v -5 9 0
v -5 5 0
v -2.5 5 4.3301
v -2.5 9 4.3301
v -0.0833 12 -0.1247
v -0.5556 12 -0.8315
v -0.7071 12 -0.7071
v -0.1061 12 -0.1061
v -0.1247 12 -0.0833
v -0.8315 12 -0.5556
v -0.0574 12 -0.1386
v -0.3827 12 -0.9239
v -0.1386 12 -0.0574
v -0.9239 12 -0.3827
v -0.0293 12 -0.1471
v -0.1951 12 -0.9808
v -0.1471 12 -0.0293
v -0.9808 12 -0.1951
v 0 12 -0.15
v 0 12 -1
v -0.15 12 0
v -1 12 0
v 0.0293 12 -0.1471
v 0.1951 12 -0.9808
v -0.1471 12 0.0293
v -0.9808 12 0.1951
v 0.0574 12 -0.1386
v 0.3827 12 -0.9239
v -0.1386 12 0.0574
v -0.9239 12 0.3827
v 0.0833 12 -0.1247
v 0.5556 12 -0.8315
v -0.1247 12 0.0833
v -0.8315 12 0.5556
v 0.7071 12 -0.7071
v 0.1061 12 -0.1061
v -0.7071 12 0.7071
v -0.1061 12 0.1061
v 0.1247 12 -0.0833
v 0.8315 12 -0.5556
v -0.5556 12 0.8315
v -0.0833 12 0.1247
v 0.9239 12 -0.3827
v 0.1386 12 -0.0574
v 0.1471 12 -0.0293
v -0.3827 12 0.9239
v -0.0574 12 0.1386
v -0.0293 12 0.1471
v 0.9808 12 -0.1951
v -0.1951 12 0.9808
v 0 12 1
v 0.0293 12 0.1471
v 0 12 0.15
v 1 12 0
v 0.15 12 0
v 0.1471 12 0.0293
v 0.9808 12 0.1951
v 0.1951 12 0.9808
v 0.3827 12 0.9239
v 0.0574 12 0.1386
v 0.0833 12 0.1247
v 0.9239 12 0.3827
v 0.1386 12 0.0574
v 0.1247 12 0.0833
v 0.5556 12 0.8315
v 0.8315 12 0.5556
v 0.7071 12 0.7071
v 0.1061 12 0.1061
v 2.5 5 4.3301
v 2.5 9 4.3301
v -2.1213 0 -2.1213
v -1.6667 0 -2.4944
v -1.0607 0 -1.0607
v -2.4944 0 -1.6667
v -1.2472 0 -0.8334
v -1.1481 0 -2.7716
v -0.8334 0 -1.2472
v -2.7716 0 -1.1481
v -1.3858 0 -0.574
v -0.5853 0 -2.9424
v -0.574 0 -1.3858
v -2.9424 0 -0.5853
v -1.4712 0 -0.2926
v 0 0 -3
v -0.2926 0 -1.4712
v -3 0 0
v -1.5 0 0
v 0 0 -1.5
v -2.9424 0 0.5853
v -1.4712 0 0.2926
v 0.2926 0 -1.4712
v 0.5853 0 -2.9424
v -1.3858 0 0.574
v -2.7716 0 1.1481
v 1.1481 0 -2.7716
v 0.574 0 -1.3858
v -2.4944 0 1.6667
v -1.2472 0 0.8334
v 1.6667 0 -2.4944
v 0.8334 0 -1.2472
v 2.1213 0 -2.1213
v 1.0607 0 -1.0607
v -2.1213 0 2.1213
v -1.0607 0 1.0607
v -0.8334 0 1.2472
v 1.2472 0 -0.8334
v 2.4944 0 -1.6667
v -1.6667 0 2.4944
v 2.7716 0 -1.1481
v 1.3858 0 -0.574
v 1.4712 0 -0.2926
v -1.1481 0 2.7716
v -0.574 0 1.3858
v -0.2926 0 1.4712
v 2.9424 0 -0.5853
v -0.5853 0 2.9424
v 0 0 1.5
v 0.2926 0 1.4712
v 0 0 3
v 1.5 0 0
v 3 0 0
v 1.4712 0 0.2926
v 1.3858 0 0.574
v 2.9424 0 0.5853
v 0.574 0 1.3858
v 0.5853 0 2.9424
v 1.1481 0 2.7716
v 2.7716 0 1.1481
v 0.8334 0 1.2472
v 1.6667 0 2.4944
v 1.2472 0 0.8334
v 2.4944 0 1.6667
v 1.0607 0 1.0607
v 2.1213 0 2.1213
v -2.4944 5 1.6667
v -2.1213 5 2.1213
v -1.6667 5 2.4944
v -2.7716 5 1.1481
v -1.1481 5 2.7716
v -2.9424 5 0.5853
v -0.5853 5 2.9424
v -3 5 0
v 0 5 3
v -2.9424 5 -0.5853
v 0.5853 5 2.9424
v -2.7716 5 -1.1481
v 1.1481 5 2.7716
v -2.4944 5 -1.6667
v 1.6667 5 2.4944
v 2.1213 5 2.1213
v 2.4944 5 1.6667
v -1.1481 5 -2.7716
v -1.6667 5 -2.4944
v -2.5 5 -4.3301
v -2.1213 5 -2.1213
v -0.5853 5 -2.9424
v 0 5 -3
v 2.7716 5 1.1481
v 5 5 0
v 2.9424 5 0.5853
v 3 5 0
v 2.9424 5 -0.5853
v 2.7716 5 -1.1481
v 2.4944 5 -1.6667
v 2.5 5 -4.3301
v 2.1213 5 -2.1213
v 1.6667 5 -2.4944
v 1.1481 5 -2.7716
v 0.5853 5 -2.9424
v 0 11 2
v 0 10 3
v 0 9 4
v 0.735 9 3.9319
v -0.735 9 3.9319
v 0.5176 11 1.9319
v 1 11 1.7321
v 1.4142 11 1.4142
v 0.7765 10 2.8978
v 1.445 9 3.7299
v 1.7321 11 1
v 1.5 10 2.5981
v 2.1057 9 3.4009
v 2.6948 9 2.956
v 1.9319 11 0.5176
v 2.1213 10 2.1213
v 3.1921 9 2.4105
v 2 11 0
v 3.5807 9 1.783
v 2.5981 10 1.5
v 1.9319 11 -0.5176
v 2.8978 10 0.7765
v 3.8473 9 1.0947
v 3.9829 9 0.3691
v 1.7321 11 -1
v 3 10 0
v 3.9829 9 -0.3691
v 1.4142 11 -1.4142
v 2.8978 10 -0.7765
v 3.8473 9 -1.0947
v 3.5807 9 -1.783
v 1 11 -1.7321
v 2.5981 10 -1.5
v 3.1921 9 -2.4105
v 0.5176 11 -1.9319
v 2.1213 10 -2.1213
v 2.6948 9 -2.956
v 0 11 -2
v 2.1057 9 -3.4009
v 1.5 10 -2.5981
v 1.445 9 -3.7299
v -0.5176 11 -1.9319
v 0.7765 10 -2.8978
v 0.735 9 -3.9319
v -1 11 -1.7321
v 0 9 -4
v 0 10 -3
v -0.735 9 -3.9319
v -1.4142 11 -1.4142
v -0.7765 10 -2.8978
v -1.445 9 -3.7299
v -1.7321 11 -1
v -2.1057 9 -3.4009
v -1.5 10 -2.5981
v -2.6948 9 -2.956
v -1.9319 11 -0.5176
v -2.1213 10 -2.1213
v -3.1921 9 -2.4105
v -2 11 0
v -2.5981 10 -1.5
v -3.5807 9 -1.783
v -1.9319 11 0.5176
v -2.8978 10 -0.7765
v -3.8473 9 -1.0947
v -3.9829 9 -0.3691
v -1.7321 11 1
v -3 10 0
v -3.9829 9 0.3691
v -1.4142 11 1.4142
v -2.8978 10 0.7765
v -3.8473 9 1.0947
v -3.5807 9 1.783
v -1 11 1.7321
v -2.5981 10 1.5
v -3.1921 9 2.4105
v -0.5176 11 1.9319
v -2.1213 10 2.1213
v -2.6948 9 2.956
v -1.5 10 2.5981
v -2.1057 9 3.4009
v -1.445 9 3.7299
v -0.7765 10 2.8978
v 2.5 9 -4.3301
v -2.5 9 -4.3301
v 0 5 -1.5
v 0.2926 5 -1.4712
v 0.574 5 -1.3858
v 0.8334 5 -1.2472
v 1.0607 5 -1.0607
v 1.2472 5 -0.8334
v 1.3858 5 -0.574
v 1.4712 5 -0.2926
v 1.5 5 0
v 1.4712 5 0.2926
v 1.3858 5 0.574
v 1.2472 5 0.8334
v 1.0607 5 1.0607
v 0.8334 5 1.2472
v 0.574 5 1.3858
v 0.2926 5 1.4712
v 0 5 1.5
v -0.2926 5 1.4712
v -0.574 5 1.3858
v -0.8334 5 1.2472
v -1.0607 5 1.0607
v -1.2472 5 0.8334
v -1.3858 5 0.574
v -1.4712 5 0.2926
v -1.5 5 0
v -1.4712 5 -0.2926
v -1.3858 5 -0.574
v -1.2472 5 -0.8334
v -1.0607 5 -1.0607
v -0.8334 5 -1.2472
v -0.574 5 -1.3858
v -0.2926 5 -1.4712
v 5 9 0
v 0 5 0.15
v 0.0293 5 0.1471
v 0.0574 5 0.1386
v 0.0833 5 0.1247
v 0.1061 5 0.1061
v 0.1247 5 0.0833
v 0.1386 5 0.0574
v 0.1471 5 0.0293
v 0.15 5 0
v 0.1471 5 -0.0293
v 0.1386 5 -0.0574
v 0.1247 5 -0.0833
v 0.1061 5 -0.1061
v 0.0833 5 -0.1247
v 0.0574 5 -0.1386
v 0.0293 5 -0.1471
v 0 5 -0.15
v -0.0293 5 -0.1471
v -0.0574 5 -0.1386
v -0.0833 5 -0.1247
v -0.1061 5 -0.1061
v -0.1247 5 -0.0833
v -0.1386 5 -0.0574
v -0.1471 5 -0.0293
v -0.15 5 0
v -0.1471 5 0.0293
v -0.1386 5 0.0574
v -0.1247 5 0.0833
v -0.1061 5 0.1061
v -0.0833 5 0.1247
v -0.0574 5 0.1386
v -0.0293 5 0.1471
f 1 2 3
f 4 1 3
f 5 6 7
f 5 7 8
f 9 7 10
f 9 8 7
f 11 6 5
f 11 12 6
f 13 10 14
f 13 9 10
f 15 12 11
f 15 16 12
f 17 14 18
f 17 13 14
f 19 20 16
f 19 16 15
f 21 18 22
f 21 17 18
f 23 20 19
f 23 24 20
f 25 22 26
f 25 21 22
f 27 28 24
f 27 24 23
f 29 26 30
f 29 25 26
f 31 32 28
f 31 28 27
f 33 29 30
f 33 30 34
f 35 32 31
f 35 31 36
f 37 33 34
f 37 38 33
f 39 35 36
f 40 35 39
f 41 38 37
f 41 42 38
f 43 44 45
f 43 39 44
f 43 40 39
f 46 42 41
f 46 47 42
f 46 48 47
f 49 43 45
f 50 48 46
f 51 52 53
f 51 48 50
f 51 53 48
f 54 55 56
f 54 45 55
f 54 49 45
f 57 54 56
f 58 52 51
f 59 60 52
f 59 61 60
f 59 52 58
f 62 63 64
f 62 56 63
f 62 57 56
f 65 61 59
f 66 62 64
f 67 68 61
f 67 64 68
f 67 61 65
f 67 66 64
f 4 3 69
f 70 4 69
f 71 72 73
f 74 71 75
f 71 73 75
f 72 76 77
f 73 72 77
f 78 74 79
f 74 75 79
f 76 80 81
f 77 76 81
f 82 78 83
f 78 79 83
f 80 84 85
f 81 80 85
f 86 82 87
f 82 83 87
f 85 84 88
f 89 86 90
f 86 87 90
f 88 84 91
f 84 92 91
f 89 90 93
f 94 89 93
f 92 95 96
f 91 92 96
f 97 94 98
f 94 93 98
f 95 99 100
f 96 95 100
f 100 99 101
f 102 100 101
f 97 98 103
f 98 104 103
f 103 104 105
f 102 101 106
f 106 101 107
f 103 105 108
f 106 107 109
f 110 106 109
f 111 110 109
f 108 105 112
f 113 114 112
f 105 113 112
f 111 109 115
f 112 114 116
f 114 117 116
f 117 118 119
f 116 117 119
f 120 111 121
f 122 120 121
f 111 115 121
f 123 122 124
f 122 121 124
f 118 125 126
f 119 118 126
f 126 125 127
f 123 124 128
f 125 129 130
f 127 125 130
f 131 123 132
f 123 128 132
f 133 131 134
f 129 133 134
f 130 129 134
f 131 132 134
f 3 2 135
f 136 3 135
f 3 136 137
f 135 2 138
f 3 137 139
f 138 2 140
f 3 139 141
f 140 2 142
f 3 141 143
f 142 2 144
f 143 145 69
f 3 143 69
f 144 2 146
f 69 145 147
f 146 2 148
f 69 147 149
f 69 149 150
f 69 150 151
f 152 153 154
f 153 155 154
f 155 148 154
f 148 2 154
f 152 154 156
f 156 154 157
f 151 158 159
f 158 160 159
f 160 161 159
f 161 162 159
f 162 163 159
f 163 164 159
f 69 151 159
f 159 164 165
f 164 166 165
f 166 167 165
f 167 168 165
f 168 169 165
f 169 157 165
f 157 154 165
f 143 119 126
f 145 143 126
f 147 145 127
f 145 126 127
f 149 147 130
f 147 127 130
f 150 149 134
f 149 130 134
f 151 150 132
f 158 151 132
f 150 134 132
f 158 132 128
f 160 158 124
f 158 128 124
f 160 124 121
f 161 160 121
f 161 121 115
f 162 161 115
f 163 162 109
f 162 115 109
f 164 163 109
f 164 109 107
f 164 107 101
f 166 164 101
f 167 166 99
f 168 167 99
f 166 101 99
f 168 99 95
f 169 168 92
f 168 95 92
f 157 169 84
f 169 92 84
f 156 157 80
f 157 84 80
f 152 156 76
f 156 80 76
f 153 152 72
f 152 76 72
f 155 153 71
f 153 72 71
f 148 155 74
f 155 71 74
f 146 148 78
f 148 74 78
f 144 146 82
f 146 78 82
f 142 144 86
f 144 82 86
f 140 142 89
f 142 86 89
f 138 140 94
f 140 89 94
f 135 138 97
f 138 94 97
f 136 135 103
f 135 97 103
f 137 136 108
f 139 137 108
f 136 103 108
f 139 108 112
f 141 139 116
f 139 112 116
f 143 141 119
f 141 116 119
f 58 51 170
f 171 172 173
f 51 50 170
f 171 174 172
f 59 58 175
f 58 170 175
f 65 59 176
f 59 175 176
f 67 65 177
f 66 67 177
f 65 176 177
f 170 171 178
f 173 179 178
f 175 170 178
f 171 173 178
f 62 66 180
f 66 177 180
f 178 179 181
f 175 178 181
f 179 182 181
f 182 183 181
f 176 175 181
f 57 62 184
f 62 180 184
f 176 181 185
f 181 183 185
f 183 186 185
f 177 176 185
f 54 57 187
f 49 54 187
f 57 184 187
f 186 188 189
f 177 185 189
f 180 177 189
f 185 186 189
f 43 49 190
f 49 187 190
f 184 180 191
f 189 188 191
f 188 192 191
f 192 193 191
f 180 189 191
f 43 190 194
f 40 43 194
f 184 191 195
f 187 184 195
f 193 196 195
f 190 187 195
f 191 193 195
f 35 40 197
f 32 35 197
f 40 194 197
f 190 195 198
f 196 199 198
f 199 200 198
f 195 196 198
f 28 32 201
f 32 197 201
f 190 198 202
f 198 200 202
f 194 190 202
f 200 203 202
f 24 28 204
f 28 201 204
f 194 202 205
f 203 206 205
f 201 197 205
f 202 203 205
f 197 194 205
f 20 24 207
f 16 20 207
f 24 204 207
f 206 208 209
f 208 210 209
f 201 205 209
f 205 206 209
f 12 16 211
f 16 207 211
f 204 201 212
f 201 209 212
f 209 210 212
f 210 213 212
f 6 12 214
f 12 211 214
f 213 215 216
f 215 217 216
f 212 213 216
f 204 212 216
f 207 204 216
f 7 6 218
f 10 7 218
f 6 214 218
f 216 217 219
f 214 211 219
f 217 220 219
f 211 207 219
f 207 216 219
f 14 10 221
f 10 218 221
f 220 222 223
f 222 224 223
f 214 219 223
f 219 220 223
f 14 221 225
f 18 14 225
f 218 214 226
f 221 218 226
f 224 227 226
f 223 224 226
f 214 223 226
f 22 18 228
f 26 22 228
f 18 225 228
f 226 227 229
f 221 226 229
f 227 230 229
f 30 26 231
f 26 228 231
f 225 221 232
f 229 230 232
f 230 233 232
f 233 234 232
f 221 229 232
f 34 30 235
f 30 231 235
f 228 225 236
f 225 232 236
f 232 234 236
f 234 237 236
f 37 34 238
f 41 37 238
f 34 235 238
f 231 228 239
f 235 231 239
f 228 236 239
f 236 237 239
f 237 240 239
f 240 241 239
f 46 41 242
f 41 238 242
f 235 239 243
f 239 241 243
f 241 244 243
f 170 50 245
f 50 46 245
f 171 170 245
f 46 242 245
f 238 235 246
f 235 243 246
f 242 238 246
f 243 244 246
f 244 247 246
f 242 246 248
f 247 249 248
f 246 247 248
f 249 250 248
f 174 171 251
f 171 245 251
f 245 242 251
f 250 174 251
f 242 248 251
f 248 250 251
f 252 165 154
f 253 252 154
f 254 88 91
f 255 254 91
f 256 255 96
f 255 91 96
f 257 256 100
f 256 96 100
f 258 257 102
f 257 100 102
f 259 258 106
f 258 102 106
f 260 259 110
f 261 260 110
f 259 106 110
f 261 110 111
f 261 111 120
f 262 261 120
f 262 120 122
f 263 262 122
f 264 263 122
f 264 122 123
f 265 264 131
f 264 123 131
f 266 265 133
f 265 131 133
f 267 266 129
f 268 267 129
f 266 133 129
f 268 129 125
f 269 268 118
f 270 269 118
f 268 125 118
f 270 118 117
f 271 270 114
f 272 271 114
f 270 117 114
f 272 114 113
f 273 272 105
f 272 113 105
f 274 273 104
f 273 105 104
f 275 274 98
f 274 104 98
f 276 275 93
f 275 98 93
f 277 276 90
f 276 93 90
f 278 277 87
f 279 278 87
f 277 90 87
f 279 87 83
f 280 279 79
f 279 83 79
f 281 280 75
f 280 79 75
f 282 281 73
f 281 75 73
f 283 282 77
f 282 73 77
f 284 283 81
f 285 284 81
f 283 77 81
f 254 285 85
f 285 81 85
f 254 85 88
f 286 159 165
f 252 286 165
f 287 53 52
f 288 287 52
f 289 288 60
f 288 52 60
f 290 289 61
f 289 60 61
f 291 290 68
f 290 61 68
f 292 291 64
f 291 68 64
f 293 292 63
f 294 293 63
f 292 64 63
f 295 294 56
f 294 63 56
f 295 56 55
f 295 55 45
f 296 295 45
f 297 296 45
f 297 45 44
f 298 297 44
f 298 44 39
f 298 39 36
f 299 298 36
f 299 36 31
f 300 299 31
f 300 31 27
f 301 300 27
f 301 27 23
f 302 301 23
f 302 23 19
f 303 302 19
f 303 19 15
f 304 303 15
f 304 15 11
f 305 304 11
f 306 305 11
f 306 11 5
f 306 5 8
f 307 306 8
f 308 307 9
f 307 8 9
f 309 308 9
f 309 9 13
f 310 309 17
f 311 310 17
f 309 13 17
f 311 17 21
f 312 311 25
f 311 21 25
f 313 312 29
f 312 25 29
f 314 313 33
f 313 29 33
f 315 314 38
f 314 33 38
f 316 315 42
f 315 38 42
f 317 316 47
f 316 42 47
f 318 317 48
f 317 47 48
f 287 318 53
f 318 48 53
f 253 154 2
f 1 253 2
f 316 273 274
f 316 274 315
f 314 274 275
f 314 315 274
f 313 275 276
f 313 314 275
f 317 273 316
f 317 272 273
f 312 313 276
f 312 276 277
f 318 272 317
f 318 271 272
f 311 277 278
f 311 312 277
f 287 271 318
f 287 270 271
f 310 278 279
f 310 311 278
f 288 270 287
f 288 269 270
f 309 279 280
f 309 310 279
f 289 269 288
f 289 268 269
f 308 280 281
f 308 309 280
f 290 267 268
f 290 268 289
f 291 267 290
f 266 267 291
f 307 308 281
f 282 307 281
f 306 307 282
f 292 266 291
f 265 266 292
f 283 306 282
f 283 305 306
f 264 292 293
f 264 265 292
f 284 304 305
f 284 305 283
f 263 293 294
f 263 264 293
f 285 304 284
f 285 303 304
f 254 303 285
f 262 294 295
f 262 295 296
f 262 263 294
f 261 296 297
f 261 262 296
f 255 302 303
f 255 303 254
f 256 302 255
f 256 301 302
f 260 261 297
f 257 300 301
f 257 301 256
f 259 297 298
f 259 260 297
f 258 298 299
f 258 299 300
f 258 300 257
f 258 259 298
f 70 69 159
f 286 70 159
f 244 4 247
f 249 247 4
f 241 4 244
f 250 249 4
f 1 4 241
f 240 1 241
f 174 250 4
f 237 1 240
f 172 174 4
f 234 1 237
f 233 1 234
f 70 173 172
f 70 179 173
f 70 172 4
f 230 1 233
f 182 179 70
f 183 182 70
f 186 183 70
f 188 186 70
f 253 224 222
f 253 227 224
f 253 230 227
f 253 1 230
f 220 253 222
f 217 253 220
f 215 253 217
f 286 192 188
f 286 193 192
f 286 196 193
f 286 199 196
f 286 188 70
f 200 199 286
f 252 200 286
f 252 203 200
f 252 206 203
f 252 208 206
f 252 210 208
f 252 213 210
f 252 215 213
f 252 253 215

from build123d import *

# Parameters (mm, degrees)
SKETCH1_R           = 3
BOSS_EXTRUDE1_DEPTH = 5
BOSS_EXTRUDE2_DEPTH = 4
SKETCH4_R           = 1
BOSS_EXTRUDE4_DEPTH = 3
DRAFT4_ANGLE        = 45
SKETCH5_R           = 0.15
CUT_EXTRUDE1_DEPTH  = 50
SKETCH6_R           = 1.5
CUT_EXTRUDE2_DEPTH  = 5


with BuildPart() as part:
    # Sketch1 → Boss-Extrude1 (new body)
    with BuildSketch(Plane(origin=(0, 0, 0), x_dir=(1, 0, 0), z_dir=(0, 1, 0))):
        with Locations(Location((0, 0, 0), (0, 0, 270))):
            Circle(SKETCH1_R)
    extrude(amount=BOSS_EXTRUDE1_DEPTH)

    # Sketch2 → Boss-Extrude2 (add)
    with BuildSketch(Plane(origin=(0, 5, 0), x_dir=(1, 0, 0), z_dir=(0, 1, 0))):
        Polygon((5, 0), (2.5, 4.330127019), (-2.5, 4.330127019), (-5, 0), (-2.5, -4.330127019), (2.5, -4.330127019), align=None)
    extrude(amount=BOSS_EXTRUDE2_DEPTH)

    # Sketch4 → Boss-Extrude4 (add)
    with BuildSketch(Plane(origin=(0, 9, 0), x_dir=(1, 0, 0), z_dir=(0, 1, 0))):
        with Locations(Location((0, 0, 0), (0, 0, 270))):
            Circle(SKETCH4_R)
    extrude(amount=BOSS_EXTRUDE4_DEPTH)

    # Draft4
    draft4_faces = [part.faces().sort_by_distance(p)[0] for p in [
        (0, 10.5, -1),
    ]]
    draft(draft4_faces, Plane.ZX.offset(12), DRAFT4_ANGLE)

    # Sketch5 → Cut-Extrude1 (cut)
    with BuildSketch(Plane(origin=(0, 12, 0), x_dir=(1, 0, 0), z_dir=(0, 1, 0))):
        with Locations(Location((0, 0, 0), (0, 0, 270))):
            Circle(SKETCH5_R)
    extrude(amount=-CUT_EXTRUDE1_DEPTH, mode=Mode.SUBTRACT)

    # Sketch6 → Cut-Extrude2 (cut)
    with BuildSketch(Plane.XZ):
        with Locations(Location((0, 0, 0), (0, 0, 270))):
            Circle(SKETCH6_R)
    extrude(amount=-CUT_EXTRUDE2_DEPTH, mode=Mode.SUBTRACT)


solid = part.part
